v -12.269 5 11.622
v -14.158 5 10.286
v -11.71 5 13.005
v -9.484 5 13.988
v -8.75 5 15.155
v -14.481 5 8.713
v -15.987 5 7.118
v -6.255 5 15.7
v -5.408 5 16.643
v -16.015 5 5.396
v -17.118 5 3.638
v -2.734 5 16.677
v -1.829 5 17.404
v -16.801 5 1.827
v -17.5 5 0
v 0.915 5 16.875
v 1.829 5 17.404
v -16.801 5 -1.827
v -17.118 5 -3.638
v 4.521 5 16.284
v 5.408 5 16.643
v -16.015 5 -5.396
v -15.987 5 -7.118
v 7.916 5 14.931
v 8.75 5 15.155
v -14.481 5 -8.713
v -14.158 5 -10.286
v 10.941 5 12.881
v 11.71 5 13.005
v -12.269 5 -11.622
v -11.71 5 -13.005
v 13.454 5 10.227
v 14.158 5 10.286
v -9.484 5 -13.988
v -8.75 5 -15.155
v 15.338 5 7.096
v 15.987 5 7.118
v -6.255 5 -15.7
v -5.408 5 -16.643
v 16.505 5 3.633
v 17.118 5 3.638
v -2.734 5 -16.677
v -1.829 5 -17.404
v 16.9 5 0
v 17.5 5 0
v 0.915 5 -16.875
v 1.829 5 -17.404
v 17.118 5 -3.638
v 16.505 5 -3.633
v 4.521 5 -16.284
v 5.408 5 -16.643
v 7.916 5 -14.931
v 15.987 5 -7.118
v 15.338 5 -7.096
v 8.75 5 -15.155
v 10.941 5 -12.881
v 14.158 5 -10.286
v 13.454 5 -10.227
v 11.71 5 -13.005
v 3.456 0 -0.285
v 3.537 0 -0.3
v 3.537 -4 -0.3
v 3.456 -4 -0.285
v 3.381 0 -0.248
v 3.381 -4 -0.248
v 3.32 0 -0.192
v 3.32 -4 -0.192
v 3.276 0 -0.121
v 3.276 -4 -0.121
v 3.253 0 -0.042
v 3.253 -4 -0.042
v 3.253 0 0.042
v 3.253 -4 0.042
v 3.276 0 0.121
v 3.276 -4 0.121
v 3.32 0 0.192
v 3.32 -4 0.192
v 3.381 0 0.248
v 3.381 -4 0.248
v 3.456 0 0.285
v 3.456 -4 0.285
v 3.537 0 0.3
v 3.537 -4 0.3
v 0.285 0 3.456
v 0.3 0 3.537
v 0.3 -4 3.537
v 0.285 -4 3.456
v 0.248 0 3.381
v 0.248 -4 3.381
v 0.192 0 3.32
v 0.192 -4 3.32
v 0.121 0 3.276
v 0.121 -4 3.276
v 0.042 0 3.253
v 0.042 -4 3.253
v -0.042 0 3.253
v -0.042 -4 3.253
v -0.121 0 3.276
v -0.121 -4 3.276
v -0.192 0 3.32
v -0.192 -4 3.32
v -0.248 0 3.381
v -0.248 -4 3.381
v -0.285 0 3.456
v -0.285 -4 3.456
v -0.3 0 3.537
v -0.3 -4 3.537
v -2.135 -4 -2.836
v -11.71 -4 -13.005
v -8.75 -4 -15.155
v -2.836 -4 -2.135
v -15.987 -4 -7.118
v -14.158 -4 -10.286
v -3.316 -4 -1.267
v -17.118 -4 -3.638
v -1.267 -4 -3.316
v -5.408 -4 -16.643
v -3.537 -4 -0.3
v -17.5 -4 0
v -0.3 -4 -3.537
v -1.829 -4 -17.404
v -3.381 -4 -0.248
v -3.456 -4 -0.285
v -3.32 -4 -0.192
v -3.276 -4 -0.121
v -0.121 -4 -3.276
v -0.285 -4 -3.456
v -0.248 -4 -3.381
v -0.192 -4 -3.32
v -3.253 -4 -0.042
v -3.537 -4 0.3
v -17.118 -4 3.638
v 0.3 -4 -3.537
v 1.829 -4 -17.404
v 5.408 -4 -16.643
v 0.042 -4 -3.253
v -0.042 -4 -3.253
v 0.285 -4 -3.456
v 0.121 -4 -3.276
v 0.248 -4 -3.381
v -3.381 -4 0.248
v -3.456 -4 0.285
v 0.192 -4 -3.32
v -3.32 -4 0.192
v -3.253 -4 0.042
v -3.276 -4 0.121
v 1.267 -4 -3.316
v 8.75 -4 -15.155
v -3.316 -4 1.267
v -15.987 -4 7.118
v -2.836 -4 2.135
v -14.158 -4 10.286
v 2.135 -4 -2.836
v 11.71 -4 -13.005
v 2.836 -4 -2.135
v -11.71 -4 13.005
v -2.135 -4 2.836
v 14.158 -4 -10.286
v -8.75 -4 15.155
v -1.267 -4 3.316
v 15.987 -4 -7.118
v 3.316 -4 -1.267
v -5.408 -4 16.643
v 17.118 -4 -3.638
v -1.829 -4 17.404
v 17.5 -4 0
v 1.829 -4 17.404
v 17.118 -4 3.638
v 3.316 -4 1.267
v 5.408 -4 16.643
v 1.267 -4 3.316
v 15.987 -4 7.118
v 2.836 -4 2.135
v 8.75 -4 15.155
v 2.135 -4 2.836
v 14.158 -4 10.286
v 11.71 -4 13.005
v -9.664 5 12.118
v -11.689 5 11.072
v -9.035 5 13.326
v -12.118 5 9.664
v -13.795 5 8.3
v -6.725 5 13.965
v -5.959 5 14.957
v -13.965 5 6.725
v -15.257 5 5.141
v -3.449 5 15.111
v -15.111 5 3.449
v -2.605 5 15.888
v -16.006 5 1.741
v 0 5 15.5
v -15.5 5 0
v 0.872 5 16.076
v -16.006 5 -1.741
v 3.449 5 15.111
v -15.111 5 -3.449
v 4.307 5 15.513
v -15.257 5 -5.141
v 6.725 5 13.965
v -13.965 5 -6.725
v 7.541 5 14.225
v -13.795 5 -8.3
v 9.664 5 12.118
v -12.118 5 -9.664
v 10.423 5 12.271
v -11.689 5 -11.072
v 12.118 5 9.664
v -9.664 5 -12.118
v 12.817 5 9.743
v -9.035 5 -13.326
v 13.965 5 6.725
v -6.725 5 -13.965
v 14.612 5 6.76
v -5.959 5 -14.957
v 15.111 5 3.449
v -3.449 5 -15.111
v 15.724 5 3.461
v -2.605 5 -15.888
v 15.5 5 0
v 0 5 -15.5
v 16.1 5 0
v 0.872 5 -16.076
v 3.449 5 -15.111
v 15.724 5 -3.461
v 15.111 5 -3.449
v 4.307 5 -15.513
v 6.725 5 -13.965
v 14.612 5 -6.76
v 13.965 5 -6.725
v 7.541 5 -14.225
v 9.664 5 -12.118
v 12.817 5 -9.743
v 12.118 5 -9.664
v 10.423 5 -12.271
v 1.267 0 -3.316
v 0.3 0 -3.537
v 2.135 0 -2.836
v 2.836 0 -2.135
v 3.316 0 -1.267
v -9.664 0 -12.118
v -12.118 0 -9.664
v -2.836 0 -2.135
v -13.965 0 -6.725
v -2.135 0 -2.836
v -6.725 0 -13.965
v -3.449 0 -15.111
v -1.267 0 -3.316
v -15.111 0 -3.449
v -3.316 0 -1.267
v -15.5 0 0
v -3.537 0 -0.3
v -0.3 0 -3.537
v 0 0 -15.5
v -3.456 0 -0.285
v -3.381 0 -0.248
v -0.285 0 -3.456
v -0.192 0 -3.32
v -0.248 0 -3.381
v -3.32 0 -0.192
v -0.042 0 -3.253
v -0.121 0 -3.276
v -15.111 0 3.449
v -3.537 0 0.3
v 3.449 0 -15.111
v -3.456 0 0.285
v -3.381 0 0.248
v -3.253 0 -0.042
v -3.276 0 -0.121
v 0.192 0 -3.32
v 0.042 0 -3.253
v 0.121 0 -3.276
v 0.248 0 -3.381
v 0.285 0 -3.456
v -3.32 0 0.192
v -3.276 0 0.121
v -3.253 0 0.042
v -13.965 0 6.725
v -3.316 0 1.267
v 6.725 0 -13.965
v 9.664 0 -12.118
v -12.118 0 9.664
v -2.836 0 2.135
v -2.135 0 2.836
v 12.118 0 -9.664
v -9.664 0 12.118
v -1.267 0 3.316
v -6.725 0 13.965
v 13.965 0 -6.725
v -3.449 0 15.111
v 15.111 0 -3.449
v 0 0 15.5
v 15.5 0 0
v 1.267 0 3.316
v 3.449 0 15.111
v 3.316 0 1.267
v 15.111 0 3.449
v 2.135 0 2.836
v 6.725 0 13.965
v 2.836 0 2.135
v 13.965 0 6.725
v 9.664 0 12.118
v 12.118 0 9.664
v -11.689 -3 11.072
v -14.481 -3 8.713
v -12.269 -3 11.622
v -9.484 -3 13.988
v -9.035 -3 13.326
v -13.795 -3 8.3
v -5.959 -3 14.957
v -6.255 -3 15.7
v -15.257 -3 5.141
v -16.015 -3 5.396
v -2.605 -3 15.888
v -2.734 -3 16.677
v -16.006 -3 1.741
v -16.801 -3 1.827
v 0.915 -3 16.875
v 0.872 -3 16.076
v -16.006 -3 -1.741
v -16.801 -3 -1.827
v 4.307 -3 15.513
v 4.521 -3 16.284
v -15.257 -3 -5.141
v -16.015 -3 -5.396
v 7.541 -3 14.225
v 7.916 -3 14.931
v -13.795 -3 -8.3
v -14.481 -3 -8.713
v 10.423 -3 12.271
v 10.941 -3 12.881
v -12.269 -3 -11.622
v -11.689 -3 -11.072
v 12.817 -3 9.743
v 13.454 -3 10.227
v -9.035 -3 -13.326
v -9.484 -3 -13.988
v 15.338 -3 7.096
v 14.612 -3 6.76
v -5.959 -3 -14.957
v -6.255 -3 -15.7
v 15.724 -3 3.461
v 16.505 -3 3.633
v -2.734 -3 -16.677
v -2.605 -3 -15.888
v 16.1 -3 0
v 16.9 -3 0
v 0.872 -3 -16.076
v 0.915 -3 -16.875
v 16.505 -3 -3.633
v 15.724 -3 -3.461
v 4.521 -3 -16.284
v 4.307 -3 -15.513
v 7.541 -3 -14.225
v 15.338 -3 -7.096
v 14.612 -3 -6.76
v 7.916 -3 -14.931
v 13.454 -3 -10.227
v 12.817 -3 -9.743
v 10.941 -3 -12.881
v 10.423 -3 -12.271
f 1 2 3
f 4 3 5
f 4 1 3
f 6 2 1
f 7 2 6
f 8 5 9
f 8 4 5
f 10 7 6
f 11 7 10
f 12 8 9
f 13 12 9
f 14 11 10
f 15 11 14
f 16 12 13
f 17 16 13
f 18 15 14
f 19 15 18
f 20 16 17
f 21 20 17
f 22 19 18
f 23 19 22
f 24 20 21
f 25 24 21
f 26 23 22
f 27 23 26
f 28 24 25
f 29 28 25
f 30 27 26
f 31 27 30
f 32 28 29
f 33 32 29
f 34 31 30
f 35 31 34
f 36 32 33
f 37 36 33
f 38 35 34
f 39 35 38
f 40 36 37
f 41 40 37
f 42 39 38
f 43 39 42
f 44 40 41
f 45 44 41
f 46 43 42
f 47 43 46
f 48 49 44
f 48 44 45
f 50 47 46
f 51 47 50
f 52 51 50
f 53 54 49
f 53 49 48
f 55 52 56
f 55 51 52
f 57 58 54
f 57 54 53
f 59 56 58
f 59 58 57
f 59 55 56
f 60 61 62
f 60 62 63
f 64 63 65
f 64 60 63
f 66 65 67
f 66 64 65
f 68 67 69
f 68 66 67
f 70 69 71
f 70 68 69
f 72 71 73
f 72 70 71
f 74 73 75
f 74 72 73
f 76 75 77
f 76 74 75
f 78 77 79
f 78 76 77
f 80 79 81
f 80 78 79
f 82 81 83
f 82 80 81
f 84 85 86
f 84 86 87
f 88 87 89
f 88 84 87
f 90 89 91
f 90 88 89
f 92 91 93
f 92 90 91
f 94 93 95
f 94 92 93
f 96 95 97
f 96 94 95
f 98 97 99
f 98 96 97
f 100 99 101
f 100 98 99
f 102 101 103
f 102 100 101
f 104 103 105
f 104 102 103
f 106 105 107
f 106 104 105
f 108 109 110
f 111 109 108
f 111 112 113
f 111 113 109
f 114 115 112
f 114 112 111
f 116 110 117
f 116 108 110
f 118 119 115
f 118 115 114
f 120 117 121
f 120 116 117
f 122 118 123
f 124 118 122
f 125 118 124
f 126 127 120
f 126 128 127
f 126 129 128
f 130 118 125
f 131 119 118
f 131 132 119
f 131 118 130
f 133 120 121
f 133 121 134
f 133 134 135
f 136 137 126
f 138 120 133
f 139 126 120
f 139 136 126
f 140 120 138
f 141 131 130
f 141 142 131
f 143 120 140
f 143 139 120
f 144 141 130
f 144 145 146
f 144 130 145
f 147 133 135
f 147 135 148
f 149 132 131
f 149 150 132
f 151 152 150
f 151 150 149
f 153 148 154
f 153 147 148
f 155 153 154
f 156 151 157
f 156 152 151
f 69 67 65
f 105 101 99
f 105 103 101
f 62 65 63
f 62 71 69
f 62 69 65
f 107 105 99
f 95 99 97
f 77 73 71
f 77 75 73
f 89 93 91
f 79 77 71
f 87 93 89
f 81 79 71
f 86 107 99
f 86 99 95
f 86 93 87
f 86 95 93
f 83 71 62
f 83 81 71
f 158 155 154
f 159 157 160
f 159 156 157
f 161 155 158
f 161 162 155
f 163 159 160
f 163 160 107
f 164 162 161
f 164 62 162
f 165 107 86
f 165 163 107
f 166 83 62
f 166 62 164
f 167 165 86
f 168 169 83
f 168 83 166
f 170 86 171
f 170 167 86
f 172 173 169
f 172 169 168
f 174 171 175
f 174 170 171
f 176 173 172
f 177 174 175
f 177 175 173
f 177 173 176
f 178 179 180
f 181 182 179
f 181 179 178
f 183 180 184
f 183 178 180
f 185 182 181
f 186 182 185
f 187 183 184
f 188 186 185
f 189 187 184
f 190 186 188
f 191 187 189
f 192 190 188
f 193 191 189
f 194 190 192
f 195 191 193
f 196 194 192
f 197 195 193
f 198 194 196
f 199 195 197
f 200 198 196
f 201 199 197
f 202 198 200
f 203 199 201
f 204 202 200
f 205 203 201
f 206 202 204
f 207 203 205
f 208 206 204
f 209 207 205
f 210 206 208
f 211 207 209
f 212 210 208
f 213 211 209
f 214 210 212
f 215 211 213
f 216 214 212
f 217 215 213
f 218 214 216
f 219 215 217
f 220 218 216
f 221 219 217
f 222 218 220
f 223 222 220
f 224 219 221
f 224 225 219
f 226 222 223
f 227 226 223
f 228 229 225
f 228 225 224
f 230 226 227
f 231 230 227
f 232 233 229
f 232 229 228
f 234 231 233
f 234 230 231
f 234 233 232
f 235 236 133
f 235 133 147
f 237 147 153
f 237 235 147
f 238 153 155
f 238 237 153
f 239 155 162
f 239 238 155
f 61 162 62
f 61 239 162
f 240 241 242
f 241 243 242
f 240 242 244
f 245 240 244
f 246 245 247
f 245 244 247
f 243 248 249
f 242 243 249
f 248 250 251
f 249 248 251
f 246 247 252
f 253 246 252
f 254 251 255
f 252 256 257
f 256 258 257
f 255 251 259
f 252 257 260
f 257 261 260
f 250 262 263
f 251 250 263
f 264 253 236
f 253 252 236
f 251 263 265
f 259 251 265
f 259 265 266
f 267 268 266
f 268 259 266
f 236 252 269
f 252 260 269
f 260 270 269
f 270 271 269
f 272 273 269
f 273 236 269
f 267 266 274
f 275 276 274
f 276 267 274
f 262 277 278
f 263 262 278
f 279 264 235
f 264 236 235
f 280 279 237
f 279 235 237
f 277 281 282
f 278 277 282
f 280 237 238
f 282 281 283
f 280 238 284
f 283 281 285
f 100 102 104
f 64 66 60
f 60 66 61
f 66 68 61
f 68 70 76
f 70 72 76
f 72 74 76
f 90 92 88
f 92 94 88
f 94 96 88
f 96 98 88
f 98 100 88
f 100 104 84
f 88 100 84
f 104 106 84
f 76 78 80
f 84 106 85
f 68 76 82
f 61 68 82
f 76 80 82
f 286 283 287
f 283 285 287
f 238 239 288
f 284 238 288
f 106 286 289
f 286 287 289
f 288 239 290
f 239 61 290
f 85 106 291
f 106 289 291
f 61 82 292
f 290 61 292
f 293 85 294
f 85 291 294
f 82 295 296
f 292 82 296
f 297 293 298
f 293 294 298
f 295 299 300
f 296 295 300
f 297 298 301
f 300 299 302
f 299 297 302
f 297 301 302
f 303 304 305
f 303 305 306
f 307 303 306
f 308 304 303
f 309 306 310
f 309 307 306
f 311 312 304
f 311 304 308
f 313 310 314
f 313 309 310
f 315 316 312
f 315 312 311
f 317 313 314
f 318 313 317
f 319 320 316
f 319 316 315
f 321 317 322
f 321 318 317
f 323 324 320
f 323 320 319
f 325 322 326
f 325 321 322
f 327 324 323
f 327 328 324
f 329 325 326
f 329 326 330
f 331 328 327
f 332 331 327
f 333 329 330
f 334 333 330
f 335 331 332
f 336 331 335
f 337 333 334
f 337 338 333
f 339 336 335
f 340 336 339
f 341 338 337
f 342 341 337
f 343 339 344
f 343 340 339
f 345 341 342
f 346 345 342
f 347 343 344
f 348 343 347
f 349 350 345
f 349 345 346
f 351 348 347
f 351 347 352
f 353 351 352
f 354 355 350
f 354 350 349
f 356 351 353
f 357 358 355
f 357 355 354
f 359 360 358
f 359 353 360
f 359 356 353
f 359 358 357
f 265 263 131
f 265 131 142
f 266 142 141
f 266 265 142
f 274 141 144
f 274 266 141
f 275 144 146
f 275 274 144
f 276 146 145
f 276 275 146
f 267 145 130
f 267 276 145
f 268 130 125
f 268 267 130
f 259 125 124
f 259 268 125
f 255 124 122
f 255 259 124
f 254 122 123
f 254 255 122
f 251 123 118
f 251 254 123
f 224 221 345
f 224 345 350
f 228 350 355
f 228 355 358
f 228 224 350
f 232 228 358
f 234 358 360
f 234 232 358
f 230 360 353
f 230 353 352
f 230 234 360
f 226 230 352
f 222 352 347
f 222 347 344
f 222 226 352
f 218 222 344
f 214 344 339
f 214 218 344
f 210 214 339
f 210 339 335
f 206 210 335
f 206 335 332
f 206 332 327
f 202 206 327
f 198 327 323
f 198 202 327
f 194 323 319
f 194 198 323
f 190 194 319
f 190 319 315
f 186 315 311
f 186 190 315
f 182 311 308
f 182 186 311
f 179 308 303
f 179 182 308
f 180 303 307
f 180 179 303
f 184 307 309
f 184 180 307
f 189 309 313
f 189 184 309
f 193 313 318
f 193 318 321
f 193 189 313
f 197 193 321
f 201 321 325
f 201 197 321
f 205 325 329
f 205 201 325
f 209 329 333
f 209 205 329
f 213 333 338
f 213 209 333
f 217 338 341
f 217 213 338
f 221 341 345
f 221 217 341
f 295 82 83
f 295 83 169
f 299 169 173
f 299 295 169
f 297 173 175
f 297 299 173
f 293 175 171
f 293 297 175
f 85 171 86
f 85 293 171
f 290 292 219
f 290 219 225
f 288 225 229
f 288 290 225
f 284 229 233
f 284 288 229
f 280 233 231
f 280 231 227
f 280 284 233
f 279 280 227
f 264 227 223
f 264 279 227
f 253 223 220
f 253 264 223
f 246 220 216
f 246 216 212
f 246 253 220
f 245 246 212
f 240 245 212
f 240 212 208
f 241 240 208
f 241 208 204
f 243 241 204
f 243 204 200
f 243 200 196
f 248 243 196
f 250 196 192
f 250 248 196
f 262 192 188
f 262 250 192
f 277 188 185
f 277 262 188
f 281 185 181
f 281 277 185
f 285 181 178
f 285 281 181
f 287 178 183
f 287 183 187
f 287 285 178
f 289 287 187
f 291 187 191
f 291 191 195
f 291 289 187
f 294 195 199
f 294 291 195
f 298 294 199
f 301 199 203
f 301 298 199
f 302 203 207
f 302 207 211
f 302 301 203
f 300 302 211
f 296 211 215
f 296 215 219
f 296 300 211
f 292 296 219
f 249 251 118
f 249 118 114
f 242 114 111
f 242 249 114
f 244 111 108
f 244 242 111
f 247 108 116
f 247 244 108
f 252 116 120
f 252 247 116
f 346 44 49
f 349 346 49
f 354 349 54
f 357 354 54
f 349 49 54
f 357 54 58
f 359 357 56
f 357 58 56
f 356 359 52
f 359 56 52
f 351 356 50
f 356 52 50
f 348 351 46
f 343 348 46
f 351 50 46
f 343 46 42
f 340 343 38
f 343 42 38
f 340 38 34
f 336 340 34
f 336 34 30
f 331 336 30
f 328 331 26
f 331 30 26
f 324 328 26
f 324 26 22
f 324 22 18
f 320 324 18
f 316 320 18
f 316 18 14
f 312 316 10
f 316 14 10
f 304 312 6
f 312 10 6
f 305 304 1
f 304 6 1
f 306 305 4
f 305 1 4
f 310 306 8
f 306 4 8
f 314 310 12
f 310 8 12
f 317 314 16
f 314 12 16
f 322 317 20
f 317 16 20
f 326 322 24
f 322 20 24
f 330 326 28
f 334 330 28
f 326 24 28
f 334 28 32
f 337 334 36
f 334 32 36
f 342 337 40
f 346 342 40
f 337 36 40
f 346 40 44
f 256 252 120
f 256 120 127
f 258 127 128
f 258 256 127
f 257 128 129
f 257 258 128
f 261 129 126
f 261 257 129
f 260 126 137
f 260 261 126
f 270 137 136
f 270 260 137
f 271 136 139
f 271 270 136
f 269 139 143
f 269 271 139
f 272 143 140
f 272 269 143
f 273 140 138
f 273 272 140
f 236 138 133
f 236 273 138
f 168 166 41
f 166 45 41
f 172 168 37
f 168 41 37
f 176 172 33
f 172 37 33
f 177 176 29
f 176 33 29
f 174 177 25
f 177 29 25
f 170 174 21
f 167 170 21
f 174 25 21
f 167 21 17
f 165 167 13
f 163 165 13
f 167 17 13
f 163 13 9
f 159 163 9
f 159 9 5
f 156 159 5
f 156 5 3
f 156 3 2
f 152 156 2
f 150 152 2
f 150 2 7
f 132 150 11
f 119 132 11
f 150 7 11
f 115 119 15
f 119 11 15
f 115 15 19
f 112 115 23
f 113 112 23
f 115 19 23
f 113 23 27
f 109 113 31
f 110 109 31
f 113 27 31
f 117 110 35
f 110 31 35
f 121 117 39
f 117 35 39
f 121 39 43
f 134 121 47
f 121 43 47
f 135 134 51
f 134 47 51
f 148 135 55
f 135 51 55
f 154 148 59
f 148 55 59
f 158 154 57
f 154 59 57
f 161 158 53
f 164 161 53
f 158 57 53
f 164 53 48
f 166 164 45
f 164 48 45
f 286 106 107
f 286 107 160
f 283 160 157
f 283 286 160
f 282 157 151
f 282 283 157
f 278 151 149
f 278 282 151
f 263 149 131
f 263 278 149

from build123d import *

# Parameters (mm, degrees)
SKETCH1_R           = 17.5
SKETCH1_R_2         = 15.5
BOSS_EXTRUDE1_DEPTH = 5
SKETCH3_R           = 17.5
BOSS_EXTRUDE2_DEPTH = 4
SKETCH2_R           = 16.9
SKETCH2_R_2         = 16.1
CUT_EXTRUDE1_DEPTH  = 8


with BuildPart() as part:
    # Sketch1 → Boss-Extrude1 (new body)
    with BuildSketch(Plane(origin=(0, 0, 0), x_dir=(1, 0, 0), z_dir=(0, 1, 0))):
        Circle(SKETCH1_R)
        Circle(SKETCH1_R_2, mode=Mode.SUBTRACT)
    extrude(amount=BOSS_EXTRUDE1_DEPTH)

    # Sketch3 → Boss-Extrude2 (add)
    with BuildSketch(Plane.XZ):
        Circle(SKETCH3_R)
        with BuildLine():
            ThreePointArc((-0.299732076, 3.537323944), (-2.510229073, 2.510229073), (-3.537323944, 0.299732076))
            ThreePointArc((-3.537323944, 0.299732076), (-3.25, 0), (-3.537323944, -0.299732076))
            ThreePointArc((-3.537323944, -0.299732076), (-2.510229073, -2.510229073), (-0.299732076, -3.537323944))
            ThreePointArc((-0.299732076, -3.537323944), (0, -3.25), (0.299732076, -3.537323944))
            ThreePointArc((0.299732076, -3.537323944), (2.510229073, -2.510229073), (3.537323944, -0.299732076))
            ThreePointArc((3.537323944, -0.299732076), (3.25, 0), (3.537323944, 0.299732076))
            ThreePointArc((3.537323944, 0.299732076), (2.510229073, 2.510229073), (0.299732076, 3.537323944))
            ThreePointArc((0.299732076, 3.537323944), (0, 3.25), (-0.299732076, 3.537323944))
        make_face(mode=Mode.SUBTRACT)
    extrude(amount=BOSS_EXTRUDE2_DEPTH)

    # Sketch2 → Cut-Extrude1 (cut)
    with BuildSketch(Plane(origin=(0, 5, 0), x_dir=(1, 0, 0), z_dir=(0, 1, 0))):
        Circle(SKETCH2_R)
        Circle(SKETCH2_R_2, mode=Mode.SUBTRACT)
    extrude(amount=-CUT_EXTRUDE1_DEPTH, mode=Mode.SUBTRACT)


solid = part.part
